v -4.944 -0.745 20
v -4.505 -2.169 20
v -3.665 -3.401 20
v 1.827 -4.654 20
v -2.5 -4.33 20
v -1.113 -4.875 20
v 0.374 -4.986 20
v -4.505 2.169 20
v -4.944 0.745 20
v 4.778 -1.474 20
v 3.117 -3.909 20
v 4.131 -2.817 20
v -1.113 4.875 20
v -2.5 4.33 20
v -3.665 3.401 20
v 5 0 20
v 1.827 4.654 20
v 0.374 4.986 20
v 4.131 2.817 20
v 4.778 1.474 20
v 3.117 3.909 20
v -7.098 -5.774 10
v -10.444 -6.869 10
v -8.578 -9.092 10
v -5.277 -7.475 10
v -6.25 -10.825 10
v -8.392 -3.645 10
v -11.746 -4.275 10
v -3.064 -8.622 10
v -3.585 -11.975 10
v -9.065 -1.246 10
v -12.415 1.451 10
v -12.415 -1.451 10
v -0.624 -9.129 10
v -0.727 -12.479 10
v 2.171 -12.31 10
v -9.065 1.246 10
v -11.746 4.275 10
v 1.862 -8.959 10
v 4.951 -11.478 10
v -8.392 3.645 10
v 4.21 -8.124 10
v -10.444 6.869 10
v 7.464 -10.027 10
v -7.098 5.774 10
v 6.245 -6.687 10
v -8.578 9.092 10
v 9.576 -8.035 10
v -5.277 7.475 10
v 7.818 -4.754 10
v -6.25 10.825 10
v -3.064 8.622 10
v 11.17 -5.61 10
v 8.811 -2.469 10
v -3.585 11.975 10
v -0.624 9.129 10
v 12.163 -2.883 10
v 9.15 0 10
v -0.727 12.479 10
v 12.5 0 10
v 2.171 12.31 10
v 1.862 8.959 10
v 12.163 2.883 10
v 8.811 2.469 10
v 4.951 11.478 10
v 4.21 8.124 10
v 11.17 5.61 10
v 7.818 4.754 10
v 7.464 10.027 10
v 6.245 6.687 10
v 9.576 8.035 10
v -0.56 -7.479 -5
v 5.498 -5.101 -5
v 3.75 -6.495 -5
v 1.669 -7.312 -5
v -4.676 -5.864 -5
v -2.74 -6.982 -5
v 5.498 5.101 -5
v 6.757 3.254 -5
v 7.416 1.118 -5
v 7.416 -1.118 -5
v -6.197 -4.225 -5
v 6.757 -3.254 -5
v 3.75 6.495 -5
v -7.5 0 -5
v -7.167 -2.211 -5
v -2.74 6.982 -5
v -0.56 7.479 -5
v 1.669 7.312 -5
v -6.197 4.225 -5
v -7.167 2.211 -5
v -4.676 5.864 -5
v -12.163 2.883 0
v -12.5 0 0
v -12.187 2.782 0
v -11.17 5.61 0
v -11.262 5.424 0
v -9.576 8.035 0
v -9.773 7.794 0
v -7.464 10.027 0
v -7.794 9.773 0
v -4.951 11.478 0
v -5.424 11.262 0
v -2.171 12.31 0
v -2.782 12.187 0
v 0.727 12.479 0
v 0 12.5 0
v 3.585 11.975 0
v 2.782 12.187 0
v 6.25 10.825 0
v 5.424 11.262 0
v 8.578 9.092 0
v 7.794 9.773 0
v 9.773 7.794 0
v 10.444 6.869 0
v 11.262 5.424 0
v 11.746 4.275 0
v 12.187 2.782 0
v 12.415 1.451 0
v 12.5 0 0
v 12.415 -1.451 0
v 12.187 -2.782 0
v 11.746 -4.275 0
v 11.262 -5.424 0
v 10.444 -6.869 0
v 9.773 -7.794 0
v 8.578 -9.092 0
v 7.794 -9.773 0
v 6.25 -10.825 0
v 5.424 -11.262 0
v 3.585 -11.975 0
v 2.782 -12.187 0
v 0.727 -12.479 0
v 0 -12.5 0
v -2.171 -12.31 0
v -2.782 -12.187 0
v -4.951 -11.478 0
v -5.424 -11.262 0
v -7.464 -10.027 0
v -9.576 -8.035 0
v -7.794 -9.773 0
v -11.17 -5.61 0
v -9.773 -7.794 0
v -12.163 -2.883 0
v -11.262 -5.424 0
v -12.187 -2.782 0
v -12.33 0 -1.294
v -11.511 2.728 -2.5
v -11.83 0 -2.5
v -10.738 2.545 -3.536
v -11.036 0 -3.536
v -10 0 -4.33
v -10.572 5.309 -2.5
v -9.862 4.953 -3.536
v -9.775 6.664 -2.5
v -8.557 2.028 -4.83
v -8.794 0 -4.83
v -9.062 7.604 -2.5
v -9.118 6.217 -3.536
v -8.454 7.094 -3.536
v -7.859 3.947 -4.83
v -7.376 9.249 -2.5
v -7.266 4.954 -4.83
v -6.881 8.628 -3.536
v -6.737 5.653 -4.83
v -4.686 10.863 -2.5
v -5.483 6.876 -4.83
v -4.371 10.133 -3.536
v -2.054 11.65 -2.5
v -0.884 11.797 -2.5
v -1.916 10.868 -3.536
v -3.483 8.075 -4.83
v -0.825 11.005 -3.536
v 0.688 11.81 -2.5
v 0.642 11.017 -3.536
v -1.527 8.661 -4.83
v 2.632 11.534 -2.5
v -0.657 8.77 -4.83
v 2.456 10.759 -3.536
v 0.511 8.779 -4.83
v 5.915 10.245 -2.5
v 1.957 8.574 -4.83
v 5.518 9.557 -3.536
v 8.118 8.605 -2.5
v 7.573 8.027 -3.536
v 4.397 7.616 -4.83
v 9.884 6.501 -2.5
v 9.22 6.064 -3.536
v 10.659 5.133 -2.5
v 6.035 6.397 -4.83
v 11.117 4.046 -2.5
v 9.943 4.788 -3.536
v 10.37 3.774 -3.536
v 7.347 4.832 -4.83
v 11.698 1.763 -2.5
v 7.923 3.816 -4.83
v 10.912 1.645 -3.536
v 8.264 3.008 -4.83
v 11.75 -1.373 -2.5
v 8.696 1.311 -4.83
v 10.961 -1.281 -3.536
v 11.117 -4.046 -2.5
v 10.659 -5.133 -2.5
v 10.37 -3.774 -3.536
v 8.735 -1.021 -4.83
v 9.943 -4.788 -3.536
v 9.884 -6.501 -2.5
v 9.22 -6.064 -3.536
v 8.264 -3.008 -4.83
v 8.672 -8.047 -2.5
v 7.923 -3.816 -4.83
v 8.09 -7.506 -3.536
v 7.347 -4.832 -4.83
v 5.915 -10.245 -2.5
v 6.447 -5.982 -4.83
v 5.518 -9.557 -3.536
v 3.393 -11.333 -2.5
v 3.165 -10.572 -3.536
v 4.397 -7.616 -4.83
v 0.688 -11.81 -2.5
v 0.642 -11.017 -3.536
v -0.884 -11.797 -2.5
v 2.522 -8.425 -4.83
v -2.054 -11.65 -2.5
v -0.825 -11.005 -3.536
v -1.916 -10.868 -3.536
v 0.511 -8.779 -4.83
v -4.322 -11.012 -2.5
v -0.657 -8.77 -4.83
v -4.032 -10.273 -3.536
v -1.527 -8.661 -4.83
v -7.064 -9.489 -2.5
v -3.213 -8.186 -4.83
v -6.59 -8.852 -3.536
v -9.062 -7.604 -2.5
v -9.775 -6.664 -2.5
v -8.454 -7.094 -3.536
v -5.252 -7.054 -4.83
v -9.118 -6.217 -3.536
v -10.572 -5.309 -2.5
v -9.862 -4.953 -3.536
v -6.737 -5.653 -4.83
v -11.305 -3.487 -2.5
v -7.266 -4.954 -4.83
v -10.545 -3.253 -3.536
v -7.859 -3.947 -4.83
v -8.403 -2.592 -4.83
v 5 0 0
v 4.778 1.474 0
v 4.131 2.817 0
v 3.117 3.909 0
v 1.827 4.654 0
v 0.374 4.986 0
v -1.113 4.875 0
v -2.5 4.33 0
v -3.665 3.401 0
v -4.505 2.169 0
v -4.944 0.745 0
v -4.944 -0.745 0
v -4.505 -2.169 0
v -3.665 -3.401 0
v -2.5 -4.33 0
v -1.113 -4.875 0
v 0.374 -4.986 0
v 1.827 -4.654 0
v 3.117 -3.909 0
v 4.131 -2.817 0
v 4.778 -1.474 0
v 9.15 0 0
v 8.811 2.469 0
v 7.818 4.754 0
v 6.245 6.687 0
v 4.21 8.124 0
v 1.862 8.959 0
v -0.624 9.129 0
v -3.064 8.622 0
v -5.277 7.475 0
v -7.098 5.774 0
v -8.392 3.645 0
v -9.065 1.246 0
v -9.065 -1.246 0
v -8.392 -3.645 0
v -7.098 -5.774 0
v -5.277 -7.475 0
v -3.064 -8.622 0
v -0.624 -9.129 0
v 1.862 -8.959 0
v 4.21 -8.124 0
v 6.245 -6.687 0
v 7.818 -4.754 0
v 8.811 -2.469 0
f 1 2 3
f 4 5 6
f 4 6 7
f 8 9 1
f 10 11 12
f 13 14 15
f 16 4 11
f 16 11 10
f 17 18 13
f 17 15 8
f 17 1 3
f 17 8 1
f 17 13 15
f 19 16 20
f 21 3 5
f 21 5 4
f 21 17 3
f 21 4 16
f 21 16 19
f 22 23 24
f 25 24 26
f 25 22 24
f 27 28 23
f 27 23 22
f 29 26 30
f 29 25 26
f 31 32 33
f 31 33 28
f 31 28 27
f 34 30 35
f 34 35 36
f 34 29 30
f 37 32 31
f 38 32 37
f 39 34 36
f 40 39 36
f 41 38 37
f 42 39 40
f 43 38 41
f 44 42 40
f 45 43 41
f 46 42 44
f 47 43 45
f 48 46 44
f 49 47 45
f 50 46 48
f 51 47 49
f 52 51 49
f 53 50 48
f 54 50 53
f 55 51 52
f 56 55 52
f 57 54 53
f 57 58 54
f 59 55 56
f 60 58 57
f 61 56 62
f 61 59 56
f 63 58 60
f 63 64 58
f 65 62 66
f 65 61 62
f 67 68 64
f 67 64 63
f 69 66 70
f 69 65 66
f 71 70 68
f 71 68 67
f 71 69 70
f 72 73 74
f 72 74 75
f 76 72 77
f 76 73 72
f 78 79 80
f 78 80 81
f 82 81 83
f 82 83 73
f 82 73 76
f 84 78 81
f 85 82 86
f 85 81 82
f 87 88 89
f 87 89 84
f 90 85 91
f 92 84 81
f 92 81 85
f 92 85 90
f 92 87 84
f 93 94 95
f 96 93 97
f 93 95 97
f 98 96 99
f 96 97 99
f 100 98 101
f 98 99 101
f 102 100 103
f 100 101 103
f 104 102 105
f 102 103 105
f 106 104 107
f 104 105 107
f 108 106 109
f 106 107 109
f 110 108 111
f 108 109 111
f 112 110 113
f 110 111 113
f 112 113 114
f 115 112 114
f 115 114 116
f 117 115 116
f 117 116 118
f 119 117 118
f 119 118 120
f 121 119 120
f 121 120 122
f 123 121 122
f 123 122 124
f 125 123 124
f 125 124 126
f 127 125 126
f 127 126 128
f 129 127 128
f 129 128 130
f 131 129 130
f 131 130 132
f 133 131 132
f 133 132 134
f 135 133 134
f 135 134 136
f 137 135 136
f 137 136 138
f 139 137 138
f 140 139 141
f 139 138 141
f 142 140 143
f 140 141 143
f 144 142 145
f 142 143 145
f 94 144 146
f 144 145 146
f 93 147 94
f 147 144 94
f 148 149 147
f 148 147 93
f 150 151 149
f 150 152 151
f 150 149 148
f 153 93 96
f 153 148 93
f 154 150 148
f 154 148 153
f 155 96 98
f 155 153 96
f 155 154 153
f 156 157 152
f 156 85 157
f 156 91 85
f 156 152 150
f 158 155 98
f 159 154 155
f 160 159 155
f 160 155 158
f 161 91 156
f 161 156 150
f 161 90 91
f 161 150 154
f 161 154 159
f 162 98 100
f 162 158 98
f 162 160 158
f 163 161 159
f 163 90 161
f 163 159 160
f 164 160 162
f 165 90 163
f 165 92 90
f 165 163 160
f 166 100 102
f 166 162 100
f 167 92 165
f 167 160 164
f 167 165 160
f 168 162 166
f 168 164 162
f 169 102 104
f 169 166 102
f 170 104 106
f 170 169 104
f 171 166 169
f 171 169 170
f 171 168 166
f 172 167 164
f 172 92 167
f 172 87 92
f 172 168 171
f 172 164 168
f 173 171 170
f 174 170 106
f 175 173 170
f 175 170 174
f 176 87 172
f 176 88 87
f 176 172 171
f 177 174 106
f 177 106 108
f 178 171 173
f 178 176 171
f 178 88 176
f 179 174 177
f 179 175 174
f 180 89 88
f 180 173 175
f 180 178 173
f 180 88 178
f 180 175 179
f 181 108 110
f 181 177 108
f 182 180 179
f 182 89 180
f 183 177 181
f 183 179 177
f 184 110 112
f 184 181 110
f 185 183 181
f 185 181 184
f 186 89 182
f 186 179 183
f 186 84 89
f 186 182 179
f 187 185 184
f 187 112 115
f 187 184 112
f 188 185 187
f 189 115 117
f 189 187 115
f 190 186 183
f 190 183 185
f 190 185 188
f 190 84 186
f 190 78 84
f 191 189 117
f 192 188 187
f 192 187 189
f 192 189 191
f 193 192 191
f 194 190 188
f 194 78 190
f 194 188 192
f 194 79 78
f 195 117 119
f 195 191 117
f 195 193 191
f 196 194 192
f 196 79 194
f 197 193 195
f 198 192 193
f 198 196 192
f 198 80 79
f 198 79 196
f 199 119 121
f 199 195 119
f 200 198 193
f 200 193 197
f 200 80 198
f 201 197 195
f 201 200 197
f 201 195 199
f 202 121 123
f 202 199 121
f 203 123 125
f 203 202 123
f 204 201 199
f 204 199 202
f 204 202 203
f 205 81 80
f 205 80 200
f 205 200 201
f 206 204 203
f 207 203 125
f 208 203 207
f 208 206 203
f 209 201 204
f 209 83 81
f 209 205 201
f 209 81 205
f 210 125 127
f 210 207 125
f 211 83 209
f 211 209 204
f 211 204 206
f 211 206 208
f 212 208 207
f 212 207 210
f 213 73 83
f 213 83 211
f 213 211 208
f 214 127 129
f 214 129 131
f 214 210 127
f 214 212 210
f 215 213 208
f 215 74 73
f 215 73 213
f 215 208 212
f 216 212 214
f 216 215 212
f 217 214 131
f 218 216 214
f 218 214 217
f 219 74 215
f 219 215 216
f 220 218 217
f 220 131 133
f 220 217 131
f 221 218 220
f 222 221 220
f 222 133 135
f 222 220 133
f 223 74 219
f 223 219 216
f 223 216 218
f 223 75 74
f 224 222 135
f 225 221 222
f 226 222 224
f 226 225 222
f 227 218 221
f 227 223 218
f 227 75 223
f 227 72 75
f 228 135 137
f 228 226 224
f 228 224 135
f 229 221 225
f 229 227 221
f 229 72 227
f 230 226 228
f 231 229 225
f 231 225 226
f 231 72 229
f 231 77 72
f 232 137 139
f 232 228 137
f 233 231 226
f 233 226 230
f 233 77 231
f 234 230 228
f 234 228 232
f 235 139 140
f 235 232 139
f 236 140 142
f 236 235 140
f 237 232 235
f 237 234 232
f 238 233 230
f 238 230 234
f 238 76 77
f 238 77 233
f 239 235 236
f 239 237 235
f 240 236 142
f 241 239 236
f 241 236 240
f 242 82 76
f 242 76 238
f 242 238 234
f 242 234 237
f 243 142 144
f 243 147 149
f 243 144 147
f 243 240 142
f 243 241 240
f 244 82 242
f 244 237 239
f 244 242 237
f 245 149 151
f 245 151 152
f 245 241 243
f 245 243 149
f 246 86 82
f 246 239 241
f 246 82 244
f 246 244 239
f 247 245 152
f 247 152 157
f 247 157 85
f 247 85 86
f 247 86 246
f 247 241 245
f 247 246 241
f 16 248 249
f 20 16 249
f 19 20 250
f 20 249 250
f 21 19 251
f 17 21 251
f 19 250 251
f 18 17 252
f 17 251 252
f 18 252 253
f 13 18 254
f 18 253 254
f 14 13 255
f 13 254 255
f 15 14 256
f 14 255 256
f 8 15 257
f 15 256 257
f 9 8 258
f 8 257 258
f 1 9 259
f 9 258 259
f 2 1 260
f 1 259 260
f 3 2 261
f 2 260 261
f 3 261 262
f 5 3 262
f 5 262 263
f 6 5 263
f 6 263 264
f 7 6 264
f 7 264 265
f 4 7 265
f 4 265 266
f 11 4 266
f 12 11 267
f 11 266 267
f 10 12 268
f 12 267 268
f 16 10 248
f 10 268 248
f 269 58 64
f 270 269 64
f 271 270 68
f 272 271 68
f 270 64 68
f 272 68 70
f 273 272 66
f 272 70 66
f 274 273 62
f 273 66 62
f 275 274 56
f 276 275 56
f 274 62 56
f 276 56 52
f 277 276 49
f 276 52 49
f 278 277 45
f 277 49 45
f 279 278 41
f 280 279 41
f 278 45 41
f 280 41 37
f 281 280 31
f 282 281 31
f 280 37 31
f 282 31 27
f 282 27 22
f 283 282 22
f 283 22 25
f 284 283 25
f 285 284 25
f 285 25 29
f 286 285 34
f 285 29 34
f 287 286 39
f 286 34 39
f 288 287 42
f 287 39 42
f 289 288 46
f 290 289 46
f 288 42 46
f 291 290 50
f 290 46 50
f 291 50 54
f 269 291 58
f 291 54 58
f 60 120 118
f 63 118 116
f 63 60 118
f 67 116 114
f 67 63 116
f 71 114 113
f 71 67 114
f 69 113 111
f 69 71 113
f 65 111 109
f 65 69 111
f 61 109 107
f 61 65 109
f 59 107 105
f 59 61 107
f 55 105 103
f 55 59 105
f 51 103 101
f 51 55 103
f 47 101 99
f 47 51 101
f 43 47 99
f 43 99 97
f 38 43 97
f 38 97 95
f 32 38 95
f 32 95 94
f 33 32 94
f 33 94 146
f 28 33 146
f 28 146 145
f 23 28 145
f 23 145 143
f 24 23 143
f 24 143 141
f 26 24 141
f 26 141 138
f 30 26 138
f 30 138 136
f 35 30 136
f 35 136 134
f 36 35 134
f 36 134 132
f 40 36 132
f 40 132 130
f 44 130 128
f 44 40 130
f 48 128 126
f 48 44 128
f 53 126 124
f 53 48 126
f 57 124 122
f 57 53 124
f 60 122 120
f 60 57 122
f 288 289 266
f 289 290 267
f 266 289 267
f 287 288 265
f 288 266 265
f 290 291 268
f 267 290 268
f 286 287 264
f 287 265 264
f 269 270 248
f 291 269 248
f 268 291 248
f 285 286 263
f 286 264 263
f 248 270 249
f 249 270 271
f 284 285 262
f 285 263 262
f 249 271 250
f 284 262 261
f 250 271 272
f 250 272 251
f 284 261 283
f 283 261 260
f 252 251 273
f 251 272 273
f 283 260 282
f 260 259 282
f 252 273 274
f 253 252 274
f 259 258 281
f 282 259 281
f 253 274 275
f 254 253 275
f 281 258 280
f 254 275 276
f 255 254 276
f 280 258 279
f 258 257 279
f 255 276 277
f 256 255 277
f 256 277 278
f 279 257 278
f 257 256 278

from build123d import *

# Parameters (mm, degrees)
SKETCH_1_R      = 5
EXTRUDE_1_DEPTH = 20
SKETCH_2_R      = 12.5
EXTRUDE_2_DEPTH = 5
EXTRUDE_START   = 10
SKETCH_3_R      = 12.5
SKETCH_3_R_2    = 9.15
EXTRUDE_3_DEPTH = 10
FILLET_1_R      = 5


with BuildPart() as part:
    # 草图1 → 凸台-拉伸1 (new body)
    with BuildSketch(Plane.XY):
        Circle(SKETCH_1_R)
    extrude(amount=EXTRUDE_1_DEPTH)

    # 草图2 → 凸台-拉伸2 (add)
    with BuildSketch(Plane(origin=(0, 0, 0), x_dir=(-1, 0, 0), z_dir=(0, 0, -1))):
        Circle(SKETCH_2_R)
    extrude(amount=EXTRUDE_2_DEPTH)

    # 草图3 → 凸台-拉伸3 (add)
    with BuildSketch(Plane.XY.offset(EXTRUDE_START)):
        Circle(SKETCH_3_R)
        Circle(SKETCH_3_R_2, mode=Mode.SUBTRACT)
    extrude(amount=-EXTRUDE_3_DEPTH)

    # 圆角1
    fillet_1_edges = [part.edges().sort_by_distance(p)[0] for p in [
        (12.5, 0, -5),
    ]]
    fillet(fillet_1_edges, radius=FILLET_1_R - 0.0001)  # a hair under: the kernel refuses the full size


solid = part.part
